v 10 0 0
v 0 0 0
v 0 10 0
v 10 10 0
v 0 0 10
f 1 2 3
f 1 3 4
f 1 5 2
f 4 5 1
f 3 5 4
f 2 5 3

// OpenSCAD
// SYMPTOM: linear_extrude() with a scale that has a ZERO component imported as
//   a NULL shape (volume 0). OpenSCAD bakes scale=0 -> scale=[0,0] (taper to a
//   point) and scale=[0,1] tapers to a line. Non-zero scale (a frustum) was
//   already fine, so the whole solid silently vanished only for the taper case.
// CAUSE: OpenSCADFeatures.Twist.execute sweeps a Part.BRepOffsetAPI.MakePipeShell
//   between the base wire and the scaled top wire. A zero scale component makes
//   the top wire a zero-area line/point, so the sweep direction is undefined and
//   build() raises OCCError("gp_Dir() - input vector has zero norm"); the
//   except-branch left fp.Shape null.
// FIX: OpenSCADFeatures.py Twist.execute + new Twist._taper_solid /
//   Twist._planar_faces -> when there is no twist (Angle==0), a scale component
//   is 0, and the profile is a single wire, build the tapered solid by
//   connecting each base perimeter vertex to its scaled top vertex (side is a
//   triangle where the top collapses to a point, a quad otherwise; no top cap).
//   The pipe-shell path (twist, non-degenerate scale, curved single-vertex
//   profiles like circle) is untouched. Commit <pending>.
// EXPECTED (OpenSCAD): a 10x10 base extruded h=10 -->
//   scale=[0,0] pyramid  = base*h/3 = 1000/3 = 333.333
//   scale=[0,1] wedge    = base*h/2 = 500
//   scale=[0.5,0.5] frustum = h/3*(A0+A1+sqrt(A0*A1)) = 10/3*(100+25+50) = 583.333
linear_extrude(height = 10, scale = 0) square([10, 10]);
